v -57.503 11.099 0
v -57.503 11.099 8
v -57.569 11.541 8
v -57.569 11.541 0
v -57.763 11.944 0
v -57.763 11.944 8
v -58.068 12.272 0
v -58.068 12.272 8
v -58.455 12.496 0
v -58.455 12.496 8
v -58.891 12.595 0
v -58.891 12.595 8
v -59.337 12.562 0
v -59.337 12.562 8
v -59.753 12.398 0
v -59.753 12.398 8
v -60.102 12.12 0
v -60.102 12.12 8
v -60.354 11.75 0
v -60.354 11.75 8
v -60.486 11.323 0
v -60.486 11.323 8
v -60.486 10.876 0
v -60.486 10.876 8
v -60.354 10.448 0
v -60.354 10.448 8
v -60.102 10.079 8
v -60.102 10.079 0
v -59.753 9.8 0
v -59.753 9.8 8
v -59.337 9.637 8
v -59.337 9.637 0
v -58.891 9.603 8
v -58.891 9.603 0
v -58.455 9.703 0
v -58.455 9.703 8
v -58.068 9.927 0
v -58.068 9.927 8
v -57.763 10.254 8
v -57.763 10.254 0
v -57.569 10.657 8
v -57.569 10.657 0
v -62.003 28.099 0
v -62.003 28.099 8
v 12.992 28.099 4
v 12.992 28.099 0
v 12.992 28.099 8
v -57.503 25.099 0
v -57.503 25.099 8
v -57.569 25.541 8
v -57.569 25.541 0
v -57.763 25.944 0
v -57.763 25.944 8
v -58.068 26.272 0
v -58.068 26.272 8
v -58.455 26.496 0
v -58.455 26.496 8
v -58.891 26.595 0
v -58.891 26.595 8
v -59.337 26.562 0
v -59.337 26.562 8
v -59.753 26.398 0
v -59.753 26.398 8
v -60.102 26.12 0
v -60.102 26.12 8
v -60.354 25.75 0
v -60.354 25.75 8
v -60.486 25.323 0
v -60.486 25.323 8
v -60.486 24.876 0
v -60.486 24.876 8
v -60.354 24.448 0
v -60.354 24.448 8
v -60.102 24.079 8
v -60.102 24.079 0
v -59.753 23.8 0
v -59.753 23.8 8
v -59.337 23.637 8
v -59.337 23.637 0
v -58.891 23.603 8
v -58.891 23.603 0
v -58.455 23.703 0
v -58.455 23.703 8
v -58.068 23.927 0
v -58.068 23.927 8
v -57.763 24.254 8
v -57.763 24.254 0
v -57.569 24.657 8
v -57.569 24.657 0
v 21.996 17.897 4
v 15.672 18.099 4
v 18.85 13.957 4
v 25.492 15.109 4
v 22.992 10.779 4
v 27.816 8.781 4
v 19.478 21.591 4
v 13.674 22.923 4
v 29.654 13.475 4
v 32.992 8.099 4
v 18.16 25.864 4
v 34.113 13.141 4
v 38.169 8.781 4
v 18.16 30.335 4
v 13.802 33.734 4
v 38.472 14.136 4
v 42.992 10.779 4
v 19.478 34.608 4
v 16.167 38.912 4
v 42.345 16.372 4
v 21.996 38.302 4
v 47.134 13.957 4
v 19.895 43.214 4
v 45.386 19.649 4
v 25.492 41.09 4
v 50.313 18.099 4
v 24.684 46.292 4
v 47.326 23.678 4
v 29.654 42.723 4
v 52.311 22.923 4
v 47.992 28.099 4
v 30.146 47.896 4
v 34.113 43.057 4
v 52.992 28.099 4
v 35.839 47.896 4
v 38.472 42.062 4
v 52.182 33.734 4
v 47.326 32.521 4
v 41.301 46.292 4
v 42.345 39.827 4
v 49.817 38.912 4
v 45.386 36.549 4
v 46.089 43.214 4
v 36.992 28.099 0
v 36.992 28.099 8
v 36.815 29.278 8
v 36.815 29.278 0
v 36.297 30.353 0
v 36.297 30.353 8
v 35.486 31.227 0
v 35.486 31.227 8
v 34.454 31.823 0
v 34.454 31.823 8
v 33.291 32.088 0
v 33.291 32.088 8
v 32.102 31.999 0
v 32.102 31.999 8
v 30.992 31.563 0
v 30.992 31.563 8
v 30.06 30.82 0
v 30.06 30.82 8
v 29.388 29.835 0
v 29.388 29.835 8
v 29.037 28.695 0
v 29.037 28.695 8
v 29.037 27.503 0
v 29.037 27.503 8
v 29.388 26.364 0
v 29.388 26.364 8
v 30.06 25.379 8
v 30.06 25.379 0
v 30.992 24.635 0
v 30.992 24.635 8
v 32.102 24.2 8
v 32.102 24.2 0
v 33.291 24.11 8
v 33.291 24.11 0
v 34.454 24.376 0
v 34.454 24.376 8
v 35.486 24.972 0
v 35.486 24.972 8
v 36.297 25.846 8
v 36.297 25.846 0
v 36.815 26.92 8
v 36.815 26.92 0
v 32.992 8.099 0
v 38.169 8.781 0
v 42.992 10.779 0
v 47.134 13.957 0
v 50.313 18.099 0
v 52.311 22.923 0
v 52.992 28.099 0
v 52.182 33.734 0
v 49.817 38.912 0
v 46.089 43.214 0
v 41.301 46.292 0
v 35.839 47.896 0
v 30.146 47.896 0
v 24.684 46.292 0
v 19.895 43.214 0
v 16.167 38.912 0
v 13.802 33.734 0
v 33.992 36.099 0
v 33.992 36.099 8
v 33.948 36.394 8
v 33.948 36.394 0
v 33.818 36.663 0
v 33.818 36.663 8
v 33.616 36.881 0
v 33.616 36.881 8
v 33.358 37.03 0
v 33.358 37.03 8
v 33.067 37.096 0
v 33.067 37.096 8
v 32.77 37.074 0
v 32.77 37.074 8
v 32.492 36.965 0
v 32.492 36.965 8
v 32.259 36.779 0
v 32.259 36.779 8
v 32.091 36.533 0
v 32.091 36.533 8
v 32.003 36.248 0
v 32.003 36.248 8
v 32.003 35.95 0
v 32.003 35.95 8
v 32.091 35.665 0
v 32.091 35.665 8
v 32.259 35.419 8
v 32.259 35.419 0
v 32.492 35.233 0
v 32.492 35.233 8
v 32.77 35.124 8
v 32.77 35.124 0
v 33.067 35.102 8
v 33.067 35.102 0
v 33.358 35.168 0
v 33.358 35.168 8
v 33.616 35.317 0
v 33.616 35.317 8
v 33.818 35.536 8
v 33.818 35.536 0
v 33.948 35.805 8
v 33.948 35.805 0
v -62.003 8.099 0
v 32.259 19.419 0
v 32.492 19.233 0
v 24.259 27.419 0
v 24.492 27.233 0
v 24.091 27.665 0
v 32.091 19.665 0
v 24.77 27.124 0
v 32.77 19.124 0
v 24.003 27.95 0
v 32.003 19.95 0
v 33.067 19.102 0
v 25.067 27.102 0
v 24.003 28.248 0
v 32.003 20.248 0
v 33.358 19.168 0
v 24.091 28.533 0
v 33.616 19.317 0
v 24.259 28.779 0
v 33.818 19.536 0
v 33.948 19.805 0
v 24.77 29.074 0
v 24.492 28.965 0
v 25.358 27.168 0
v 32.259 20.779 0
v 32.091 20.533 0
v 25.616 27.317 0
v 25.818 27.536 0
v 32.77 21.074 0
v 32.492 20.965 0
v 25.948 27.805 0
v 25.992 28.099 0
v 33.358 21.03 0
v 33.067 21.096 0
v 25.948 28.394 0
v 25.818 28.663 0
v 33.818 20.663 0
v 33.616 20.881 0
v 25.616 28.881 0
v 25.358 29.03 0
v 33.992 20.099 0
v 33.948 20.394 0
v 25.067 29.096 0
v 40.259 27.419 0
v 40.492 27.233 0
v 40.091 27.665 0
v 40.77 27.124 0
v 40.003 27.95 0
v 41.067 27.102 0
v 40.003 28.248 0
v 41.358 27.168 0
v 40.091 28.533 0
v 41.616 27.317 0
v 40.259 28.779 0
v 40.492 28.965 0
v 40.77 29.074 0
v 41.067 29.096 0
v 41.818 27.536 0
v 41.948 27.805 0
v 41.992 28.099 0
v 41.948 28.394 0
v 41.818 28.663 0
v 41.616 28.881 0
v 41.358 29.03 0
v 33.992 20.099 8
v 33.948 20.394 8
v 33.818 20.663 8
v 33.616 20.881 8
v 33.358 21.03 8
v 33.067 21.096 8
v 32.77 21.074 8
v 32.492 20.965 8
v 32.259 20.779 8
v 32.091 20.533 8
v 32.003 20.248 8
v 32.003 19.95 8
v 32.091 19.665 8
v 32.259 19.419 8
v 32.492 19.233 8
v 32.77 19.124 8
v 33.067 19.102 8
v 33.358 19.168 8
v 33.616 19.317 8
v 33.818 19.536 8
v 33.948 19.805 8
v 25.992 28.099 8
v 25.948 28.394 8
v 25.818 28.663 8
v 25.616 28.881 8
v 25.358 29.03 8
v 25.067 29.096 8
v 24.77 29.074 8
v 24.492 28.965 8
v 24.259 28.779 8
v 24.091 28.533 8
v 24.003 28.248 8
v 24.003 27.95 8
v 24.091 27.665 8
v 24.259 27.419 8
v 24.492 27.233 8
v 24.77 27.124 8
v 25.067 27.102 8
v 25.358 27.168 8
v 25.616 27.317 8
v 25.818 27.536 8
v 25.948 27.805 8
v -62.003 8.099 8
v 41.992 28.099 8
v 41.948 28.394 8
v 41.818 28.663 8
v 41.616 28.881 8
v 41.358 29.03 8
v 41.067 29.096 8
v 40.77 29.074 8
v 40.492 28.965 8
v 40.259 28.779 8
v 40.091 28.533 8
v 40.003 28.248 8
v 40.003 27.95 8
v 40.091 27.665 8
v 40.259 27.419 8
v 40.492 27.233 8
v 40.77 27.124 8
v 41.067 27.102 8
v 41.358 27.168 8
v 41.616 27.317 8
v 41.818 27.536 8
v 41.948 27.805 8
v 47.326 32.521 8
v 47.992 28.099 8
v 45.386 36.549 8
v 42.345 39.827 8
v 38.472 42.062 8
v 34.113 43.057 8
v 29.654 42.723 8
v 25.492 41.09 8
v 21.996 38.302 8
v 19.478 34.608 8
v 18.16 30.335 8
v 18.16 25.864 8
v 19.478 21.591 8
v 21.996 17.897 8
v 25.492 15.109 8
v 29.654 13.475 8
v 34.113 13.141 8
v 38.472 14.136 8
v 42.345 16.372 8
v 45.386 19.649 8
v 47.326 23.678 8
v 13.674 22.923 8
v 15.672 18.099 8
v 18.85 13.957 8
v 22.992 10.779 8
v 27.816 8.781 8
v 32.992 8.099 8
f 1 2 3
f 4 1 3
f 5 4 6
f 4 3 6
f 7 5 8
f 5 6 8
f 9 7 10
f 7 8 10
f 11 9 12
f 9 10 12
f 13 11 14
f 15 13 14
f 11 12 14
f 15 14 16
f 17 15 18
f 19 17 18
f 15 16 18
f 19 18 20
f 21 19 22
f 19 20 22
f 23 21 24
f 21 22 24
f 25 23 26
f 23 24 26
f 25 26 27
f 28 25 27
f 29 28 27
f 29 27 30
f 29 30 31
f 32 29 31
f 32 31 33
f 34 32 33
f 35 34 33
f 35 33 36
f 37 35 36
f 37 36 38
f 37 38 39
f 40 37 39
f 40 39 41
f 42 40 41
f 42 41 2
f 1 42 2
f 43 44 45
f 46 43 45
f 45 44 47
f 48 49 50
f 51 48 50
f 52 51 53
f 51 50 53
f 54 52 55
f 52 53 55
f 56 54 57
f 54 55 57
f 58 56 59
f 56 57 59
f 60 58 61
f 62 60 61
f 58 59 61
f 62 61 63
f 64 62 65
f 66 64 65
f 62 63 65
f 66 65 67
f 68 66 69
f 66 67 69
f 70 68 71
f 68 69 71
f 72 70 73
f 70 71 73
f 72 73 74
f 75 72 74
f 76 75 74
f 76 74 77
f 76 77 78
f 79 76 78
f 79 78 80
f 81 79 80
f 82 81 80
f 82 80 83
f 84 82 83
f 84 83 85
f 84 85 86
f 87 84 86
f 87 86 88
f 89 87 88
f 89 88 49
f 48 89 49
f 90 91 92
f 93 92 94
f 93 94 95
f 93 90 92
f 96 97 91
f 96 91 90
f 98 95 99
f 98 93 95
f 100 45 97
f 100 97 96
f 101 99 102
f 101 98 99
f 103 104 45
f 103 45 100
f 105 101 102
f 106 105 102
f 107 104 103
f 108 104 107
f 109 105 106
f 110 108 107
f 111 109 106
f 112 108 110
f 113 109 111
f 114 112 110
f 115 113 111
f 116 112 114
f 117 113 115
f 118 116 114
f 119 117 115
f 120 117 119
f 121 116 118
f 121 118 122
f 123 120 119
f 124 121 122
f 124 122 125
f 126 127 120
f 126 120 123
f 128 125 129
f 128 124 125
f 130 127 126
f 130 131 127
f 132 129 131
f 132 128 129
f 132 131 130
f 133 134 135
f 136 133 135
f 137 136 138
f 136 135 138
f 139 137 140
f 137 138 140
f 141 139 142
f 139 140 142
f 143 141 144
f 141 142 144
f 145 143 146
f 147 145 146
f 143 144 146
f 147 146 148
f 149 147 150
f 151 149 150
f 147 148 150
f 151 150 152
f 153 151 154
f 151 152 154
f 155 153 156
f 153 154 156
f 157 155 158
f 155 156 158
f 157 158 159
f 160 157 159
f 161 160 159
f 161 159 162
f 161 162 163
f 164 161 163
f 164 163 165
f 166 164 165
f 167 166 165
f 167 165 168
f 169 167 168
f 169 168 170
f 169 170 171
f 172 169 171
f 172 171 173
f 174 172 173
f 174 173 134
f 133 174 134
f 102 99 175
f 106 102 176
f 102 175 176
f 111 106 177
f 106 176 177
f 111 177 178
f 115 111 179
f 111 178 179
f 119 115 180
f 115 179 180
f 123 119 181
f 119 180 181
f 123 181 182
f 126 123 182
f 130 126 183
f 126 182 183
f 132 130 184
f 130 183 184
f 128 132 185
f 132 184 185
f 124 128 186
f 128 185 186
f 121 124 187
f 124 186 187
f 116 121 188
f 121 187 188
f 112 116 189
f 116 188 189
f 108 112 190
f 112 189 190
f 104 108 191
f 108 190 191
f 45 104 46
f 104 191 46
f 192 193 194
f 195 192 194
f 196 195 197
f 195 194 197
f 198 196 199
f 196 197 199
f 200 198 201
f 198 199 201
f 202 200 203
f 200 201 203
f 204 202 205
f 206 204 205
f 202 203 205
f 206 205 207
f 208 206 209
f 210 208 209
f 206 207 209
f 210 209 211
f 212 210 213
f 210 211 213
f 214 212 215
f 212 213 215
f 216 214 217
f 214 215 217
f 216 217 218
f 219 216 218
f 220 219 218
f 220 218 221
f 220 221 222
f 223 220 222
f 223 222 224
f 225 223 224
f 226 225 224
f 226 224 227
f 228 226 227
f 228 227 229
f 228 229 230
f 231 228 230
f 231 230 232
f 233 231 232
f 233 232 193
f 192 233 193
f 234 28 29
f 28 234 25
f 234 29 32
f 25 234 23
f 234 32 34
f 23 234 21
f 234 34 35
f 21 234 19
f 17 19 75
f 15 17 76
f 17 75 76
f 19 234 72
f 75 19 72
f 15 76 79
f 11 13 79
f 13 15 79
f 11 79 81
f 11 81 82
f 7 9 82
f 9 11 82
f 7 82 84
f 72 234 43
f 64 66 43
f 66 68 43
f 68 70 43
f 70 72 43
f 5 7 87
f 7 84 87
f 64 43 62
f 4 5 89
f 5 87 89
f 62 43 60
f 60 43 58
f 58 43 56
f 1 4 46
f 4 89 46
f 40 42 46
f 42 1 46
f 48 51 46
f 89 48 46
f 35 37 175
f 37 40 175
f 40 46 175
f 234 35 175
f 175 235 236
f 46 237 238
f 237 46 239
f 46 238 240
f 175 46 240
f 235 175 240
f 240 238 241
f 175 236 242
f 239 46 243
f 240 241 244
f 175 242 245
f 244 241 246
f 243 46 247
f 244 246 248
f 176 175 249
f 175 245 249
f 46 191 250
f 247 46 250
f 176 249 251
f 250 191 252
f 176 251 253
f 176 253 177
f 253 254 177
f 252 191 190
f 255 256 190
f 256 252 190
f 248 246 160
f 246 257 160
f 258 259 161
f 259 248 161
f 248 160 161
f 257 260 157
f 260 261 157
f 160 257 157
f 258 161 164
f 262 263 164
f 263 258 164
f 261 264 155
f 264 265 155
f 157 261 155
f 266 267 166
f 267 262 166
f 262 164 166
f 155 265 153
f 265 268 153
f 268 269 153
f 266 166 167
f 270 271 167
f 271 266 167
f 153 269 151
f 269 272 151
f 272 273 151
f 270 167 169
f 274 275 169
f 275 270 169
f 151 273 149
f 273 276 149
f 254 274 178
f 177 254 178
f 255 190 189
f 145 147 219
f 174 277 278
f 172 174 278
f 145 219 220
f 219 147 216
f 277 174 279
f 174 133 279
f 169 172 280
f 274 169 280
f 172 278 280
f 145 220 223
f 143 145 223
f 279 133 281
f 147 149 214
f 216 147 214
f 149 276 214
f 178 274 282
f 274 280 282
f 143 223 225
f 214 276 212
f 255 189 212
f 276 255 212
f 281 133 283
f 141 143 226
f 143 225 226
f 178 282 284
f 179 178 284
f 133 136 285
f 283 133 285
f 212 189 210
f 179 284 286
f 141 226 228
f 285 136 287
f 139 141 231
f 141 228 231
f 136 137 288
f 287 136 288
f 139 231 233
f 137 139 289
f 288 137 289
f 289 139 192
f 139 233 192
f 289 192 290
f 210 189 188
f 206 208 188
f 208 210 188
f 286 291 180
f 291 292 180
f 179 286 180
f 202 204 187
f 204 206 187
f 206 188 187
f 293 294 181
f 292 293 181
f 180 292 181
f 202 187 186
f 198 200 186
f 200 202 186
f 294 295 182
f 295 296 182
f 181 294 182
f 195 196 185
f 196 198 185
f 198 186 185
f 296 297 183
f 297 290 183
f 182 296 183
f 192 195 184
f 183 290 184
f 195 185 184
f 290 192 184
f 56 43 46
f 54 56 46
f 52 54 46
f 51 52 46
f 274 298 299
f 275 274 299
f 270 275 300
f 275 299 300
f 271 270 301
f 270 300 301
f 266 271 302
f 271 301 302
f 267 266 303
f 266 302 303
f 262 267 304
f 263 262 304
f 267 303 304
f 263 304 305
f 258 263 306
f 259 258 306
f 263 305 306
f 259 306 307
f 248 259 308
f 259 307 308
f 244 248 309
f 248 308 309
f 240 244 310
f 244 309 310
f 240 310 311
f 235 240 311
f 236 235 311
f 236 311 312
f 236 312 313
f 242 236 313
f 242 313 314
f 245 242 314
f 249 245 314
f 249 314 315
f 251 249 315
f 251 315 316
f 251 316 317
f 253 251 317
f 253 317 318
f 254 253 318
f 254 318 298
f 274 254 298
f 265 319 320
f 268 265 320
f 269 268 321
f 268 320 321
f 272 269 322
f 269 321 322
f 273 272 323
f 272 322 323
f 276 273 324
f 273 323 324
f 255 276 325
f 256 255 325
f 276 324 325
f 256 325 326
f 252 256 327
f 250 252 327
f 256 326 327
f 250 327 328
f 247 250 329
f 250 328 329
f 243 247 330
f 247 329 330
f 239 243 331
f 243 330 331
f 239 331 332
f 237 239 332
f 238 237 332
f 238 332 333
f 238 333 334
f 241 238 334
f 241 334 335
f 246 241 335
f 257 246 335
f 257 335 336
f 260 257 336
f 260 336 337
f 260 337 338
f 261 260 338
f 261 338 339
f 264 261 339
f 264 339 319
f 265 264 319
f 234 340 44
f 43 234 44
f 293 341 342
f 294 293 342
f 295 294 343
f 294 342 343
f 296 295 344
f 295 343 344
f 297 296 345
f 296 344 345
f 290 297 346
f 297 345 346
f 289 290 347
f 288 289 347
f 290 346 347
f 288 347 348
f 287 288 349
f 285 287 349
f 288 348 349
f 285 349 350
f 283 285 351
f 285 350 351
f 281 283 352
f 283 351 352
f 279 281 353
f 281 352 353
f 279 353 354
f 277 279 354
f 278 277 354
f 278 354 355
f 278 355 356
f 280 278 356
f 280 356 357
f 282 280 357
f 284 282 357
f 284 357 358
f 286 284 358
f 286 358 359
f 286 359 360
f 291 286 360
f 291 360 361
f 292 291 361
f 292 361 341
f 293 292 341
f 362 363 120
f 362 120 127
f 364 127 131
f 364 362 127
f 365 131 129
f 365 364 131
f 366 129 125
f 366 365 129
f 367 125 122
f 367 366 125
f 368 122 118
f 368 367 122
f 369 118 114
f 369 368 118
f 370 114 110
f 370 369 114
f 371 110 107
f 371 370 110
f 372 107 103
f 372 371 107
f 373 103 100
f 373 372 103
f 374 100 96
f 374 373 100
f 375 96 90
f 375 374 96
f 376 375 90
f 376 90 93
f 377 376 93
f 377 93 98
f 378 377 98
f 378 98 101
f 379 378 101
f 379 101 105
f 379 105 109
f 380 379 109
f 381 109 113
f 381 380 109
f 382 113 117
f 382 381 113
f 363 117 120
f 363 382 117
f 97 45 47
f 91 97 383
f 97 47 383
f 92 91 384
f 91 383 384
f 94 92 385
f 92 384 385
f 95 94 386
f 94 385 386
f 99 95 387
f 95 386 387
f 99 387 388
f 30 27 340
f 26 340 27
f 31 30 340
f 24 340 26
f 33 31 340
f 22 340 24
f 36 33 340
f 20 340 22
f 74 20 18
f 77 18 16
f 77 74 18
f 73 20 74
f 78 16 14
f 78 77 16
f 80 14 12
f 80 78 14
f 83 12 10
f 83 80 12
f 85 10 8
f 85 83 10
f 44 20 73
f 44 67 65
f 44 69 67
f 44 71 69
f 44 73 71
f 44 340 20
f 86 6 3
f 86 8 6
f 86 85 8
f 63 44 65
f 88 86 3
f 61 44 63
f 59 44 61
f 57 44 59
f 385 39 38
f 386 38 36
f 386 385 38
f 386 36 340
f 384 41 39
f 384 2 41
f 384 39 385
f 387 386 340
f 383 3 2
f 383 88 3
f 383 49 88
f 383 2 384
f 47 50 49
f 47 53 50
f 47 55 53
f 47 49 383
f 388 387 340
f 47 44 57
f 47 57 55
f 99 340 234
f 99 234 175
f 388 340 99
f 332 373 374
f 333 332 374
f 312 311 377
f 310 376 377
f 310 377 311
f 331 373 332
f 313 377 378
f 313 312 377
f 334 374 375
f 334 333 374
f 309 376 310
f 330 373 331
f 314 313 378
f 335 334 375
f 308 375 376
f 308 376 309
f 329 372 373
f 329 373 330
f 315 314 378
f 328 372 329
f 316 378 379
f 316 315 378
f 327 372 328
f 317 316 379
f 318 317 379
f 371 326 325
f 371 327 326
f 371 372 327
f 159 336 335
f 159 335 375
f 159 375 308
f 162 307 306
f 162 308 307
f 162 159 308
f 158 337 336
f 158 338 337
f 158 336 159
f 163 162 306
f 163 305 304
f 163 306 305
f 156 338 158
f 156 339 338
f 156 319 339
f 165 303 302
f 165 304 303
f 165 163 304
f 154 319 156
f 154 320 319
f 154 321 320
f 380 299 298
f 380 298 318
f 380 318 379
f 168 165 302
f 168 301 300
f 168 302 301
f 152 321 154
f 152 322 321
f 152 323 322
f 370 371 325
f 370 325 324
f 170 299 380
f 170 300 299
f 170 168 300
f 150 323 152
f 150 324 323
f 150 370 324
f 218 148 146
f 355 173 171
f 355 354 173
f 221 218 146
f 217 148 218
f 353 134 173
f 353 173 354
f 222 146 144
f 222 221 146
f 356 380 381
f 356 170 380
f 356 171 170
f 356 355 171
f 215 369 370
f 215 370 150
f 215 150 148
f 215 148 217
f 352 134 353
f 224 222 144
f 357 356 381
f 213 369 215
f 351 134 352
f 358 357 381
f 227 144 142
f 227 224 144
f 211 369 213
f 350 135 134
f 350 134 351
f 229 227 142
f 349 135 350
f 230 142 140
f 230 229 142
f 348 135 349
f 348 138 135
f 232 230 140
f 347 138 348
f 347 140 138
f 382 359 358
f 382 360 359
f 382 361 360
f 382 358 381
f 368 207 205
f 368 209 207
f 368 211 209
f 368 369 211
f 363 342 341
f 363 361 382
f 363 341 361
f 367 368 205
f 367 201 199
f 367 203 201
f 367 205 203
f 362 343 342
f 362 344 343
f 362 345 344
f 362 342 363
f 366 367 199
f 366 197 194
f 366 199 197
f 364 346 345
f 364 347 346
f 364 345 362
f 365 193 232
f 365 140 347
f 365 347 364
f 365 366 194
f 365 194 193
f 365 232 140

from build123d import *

# Parameters (mm, degrees)
BOSS_EXTRU_1_DEPTH      = 8
ESQUISSE4_R             = 20
ESQUISSE4_R_2           = 15
ENL_V_MAT_EXTRU_2_DEPTH = 4
ESQUISSE5_W             = 16.42
ESQUISSE5_H             = 20
BOSS_EXTRU_2_DEPTH      = 8
ESQUISSE6_R             = 4
ESQUISSE6_R_2           = 1
ENL_V_MAT_EXTRU_3_DEPTH = 10
ESQUISSE7_R             = 1.5
ENL_V_MAT_EXTRU_4_DEPTH = 10


with BuildPart() as part:
    # Esquisse1 → Boss.-Extru.1 (new body)
    with BuildSketch(Plane.XY):
        with BuildLine():
            ThreePointArc((52.992232765, 28.099272116), (32.992232765, 48.099272116), (12.992232765, 28.099272116))
            Line((12.992232765, 28.099272116), (32.992232765, 28.099272116))
            Line((32.992232765, 28.099272116), (32.992232765, 8.099272116))
            ThreePointArc((32.992232765, 8.099272116), (47.134368389, 13.957136493), (52.992232765, 28.099272116))
        make_face()
        with BuildLine():
            Line((32.992232765, 28.099272116), (12.992232765, 28.099272116))
            ThreePointArc((12.992232765, 28.099272116), (18.850097141, 13.957136493), (32.992232765, 8.099272116))
            Line((32.992232765, 8.099272116), (32.992232765, 28.099272116))
        make_face()
        with BuildLine():
            Line((12.992232765, 28.099272116), (-45.58279523, 28.099272116))
            Line((-45.58279523, 28.099272116), (-45.58279523, 8.099272116))
            Line((-45.58279523, 8.099272116), (32.992232765, 8.099272116))
            ThreePointArc((32.992232765, 8.099272116), (18.850097141, 13.957136493), (12.992232765, 28.099272116))
        make_face()
    extrude(amount=BOSS_EXTRU_1_DEPTH)

    # Esquisse4 → Enlèv. mat.-Extru.2 (cut)
    with BuildSketch(Plane.XY.offset(8)):
        with Locations((32.992232765, 28.099272116)):
            Circle(ESQUISSE4_R)
        with Locations((32.992232765, 28.099272116)):
            Circle(ESQUISSE4_R_2, mode=Mode.SUBTRACT)
    extrude(amount=-ENL_V_MAT_EXTRU_2_DEPTH, mode=Mode.SUBTRACT)

    # Esquisse5 → Boss.-Extru.2 (add)
    with BuildSketch(Plane.XY.offset(8)):
        with Locations((-53.79279523, 18.099272116)):
            Rectangle(ESQUISSE5_W, ESQUISSE5_H)
    extrude(amount=-BOSS_EXTRU_2_DEPTH)

    # Esquisse6 → Enlèv. mat.-Extru.3 (cut)
    with BuildSketch(Plane.XY.offset(8)):
        with Locations((32.992232765, 28.099272116)):
            Circle(ESQUISSE6_R)
        with Locations((32.992232765, 36.099272116)):
            Circle(ESQUISSE6_R_2)
        with Locations((40.992232765, 28.099272116)):
            Circle(ESQUISSE6_R_2)
        with Locations((32.992232765, 20.099272116)):
            Circle(ESQUISSE6_R_2)
        with Locations((24.992232765, 28.099272116)):
            Circle(ESQUISSE6_R_2)
    extrude(amount=-ENL_V_MAT_EXTRU_3_DEPTH, mode=Mode.SUBTRACT)

    # Esquisse7 → Enlèv. mat.-Extru.4 (cut)
    with BuildSketch(Plane.XY.offset(8)):
        with Locations((-59.00279523, 25.099272116)):
            Circle(ESQUISSE7_R)
        with Locations((-59.00279523, 11.099272116)):
            Circle(ESQUISSE7_R)
    extrude(amount=-ENL_V_MAT_EXTRU_4_DEPTH, mode=Mode.SUBTRACT)


solid = part.part
